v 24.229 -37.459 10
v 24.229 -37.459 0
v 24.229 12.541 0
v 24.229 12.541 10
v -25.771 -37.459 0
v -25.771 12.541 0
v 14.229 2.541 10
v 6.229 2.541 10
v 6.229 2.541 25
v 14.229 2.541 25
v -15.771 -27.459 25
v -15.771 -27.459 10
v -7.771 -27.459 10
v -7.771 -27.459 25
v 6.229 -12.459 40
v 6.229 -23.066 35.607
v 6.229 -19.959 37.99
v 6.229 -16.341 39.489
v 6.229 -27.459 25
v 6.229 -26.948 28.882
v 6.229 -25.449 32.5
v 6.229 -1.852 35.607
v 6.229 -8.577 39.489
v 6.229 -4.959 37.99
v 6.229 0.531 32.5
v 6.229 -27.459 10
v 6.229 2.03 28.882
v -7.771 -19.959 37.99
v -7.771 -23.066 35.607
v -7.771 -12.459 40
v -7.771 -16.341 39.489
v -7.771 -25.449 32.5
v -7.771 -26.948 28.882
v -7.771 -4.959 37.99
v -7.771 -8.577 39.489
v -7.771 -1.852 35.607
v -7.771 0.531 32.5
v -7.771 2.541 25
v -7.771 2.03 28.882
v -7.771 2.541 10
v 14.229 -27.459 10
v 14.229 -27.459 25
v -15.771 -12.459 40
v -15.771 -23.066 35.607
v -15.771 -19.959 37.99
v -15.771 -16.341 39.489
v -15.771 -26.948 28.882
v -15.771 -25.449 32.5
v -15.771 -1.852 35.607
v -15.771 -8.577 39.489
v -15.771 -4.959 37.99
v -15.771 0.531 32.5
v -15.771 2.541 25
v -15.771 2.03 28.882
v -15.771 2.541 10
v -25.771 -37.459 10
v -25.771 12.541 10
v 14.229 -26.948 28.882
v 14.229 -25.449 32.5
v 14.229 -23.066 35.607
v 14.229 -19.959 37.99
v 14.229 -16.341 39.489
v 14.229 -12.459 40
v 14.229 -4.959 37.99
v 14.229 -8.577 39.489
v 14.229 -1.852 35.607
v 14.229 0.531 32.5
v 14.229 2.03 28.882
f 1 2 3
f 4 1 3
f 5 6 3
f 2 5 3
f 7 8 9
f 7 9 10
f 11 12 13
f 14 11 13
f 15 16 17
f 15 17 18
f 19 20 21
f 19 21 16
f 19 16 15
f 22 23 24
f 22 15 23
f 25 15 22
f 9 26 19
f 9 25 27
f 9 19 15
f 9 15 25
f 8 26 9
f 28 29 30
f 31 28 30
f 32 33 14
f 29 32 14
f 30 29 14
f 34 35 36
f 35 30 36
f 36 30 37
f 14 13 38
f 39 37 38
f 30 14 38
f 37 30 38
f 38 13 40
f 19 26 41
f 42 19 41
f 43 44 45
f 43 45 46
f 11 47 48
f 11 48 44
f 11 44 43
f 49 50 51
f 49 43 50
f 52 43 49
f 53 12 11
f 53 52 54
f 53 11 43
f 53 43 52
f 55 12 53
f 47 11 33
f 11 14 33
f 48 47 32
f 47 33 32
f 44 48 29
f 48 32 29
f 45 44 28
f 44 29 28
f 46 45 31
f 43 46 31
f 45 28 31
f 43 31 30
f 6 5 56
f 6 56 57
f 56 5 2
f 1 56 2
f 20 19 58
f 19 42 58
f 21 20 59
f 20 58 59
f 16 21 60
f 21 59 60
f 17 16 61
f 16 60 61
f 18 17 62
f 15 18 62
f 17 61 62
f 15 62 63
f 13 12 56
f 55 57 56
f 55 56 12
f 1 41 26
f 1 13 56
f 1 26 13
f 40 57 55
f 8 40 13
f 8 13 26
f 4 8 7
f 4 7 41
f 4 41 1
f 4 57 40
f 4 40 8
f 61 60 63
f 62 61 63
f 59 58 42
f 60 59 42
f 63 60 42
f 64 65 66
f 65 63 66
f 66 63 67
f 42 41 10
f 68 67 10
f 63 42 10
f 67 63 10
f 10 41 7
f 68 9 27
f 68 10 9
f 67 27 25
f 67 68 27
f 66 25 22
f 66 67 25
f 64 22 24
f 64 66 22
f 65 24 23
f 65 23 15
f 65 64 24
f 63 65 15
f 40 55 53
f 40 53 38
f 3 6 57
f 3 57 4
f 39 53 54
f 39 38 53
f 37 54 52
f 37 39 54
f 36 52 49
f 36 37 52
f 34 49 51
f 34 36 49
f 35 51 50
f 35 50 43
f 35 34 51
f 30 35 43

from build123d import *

# Parameters (mm, degrees)
F0_W     = 50
F0_H     = 50
F3_DEPTH = 10
F2_W     = 8
F2_H     = 30
F4_DEPTH = 40
F1_W     = 8
F1_H     = 30
F5_DEPTH = 40
F6_R     = 14.99999
F7_R     = 14.99999


# Not quite as in the source:
# - a fillet or chamfer is up to 0.001 mm smaller than in the source, because OpenCascade refuses the exact size


with BuildPart() as f3:
    # F0 (on Top) → F3 (new body)
    with BuildSketch(Plane.XY):
        with Locations((-0.7709864527, -12.4589413404)):
            Rectangle(F0_W, F0_H)
    extrude(amount=F3_DEPTH)

    # F2 (on face) → F4 (join)
    with BuildSketch(Plane.XY):
        with Locations((10.2290135473, -12.4589413404)):
            Rectangle(F2_W, F2_H)
    extrude(amount=F4_DEPTH)

    # F1 (on face) → F5 (join)
    with BuildSketch(Plane.XY):
        with Locations((-11.7709864527, -12.4589413404)):
            Rectangle(F1_W, F1_H)
    extrude(amount=F5_DEPTH)

    # F6 (radius 15 in the source; OpenCascade refuses exactly that, so slightly less here)
    f6_edges = [f3.edges().sort_by_distance(p)[0] for p in [
        (-11.770986, -27.458941, 40),
        (-11.770986, 2.541059, 40),
    ]]
    fillet(f6_edges, radius=F6_R)

    # F7 (radius 15 in the source; OpenCascade refuses exactly that, so slightly less here)
    f7_edges = [f3.edges().sort_by_distance(p)[0] for p in [
        (10.229014, 2.541059, 40),
        (10.229014, -27.458941, 40),
    ]]
    fillet(f7_edges, radius=F7_R)


solid = f3.part
